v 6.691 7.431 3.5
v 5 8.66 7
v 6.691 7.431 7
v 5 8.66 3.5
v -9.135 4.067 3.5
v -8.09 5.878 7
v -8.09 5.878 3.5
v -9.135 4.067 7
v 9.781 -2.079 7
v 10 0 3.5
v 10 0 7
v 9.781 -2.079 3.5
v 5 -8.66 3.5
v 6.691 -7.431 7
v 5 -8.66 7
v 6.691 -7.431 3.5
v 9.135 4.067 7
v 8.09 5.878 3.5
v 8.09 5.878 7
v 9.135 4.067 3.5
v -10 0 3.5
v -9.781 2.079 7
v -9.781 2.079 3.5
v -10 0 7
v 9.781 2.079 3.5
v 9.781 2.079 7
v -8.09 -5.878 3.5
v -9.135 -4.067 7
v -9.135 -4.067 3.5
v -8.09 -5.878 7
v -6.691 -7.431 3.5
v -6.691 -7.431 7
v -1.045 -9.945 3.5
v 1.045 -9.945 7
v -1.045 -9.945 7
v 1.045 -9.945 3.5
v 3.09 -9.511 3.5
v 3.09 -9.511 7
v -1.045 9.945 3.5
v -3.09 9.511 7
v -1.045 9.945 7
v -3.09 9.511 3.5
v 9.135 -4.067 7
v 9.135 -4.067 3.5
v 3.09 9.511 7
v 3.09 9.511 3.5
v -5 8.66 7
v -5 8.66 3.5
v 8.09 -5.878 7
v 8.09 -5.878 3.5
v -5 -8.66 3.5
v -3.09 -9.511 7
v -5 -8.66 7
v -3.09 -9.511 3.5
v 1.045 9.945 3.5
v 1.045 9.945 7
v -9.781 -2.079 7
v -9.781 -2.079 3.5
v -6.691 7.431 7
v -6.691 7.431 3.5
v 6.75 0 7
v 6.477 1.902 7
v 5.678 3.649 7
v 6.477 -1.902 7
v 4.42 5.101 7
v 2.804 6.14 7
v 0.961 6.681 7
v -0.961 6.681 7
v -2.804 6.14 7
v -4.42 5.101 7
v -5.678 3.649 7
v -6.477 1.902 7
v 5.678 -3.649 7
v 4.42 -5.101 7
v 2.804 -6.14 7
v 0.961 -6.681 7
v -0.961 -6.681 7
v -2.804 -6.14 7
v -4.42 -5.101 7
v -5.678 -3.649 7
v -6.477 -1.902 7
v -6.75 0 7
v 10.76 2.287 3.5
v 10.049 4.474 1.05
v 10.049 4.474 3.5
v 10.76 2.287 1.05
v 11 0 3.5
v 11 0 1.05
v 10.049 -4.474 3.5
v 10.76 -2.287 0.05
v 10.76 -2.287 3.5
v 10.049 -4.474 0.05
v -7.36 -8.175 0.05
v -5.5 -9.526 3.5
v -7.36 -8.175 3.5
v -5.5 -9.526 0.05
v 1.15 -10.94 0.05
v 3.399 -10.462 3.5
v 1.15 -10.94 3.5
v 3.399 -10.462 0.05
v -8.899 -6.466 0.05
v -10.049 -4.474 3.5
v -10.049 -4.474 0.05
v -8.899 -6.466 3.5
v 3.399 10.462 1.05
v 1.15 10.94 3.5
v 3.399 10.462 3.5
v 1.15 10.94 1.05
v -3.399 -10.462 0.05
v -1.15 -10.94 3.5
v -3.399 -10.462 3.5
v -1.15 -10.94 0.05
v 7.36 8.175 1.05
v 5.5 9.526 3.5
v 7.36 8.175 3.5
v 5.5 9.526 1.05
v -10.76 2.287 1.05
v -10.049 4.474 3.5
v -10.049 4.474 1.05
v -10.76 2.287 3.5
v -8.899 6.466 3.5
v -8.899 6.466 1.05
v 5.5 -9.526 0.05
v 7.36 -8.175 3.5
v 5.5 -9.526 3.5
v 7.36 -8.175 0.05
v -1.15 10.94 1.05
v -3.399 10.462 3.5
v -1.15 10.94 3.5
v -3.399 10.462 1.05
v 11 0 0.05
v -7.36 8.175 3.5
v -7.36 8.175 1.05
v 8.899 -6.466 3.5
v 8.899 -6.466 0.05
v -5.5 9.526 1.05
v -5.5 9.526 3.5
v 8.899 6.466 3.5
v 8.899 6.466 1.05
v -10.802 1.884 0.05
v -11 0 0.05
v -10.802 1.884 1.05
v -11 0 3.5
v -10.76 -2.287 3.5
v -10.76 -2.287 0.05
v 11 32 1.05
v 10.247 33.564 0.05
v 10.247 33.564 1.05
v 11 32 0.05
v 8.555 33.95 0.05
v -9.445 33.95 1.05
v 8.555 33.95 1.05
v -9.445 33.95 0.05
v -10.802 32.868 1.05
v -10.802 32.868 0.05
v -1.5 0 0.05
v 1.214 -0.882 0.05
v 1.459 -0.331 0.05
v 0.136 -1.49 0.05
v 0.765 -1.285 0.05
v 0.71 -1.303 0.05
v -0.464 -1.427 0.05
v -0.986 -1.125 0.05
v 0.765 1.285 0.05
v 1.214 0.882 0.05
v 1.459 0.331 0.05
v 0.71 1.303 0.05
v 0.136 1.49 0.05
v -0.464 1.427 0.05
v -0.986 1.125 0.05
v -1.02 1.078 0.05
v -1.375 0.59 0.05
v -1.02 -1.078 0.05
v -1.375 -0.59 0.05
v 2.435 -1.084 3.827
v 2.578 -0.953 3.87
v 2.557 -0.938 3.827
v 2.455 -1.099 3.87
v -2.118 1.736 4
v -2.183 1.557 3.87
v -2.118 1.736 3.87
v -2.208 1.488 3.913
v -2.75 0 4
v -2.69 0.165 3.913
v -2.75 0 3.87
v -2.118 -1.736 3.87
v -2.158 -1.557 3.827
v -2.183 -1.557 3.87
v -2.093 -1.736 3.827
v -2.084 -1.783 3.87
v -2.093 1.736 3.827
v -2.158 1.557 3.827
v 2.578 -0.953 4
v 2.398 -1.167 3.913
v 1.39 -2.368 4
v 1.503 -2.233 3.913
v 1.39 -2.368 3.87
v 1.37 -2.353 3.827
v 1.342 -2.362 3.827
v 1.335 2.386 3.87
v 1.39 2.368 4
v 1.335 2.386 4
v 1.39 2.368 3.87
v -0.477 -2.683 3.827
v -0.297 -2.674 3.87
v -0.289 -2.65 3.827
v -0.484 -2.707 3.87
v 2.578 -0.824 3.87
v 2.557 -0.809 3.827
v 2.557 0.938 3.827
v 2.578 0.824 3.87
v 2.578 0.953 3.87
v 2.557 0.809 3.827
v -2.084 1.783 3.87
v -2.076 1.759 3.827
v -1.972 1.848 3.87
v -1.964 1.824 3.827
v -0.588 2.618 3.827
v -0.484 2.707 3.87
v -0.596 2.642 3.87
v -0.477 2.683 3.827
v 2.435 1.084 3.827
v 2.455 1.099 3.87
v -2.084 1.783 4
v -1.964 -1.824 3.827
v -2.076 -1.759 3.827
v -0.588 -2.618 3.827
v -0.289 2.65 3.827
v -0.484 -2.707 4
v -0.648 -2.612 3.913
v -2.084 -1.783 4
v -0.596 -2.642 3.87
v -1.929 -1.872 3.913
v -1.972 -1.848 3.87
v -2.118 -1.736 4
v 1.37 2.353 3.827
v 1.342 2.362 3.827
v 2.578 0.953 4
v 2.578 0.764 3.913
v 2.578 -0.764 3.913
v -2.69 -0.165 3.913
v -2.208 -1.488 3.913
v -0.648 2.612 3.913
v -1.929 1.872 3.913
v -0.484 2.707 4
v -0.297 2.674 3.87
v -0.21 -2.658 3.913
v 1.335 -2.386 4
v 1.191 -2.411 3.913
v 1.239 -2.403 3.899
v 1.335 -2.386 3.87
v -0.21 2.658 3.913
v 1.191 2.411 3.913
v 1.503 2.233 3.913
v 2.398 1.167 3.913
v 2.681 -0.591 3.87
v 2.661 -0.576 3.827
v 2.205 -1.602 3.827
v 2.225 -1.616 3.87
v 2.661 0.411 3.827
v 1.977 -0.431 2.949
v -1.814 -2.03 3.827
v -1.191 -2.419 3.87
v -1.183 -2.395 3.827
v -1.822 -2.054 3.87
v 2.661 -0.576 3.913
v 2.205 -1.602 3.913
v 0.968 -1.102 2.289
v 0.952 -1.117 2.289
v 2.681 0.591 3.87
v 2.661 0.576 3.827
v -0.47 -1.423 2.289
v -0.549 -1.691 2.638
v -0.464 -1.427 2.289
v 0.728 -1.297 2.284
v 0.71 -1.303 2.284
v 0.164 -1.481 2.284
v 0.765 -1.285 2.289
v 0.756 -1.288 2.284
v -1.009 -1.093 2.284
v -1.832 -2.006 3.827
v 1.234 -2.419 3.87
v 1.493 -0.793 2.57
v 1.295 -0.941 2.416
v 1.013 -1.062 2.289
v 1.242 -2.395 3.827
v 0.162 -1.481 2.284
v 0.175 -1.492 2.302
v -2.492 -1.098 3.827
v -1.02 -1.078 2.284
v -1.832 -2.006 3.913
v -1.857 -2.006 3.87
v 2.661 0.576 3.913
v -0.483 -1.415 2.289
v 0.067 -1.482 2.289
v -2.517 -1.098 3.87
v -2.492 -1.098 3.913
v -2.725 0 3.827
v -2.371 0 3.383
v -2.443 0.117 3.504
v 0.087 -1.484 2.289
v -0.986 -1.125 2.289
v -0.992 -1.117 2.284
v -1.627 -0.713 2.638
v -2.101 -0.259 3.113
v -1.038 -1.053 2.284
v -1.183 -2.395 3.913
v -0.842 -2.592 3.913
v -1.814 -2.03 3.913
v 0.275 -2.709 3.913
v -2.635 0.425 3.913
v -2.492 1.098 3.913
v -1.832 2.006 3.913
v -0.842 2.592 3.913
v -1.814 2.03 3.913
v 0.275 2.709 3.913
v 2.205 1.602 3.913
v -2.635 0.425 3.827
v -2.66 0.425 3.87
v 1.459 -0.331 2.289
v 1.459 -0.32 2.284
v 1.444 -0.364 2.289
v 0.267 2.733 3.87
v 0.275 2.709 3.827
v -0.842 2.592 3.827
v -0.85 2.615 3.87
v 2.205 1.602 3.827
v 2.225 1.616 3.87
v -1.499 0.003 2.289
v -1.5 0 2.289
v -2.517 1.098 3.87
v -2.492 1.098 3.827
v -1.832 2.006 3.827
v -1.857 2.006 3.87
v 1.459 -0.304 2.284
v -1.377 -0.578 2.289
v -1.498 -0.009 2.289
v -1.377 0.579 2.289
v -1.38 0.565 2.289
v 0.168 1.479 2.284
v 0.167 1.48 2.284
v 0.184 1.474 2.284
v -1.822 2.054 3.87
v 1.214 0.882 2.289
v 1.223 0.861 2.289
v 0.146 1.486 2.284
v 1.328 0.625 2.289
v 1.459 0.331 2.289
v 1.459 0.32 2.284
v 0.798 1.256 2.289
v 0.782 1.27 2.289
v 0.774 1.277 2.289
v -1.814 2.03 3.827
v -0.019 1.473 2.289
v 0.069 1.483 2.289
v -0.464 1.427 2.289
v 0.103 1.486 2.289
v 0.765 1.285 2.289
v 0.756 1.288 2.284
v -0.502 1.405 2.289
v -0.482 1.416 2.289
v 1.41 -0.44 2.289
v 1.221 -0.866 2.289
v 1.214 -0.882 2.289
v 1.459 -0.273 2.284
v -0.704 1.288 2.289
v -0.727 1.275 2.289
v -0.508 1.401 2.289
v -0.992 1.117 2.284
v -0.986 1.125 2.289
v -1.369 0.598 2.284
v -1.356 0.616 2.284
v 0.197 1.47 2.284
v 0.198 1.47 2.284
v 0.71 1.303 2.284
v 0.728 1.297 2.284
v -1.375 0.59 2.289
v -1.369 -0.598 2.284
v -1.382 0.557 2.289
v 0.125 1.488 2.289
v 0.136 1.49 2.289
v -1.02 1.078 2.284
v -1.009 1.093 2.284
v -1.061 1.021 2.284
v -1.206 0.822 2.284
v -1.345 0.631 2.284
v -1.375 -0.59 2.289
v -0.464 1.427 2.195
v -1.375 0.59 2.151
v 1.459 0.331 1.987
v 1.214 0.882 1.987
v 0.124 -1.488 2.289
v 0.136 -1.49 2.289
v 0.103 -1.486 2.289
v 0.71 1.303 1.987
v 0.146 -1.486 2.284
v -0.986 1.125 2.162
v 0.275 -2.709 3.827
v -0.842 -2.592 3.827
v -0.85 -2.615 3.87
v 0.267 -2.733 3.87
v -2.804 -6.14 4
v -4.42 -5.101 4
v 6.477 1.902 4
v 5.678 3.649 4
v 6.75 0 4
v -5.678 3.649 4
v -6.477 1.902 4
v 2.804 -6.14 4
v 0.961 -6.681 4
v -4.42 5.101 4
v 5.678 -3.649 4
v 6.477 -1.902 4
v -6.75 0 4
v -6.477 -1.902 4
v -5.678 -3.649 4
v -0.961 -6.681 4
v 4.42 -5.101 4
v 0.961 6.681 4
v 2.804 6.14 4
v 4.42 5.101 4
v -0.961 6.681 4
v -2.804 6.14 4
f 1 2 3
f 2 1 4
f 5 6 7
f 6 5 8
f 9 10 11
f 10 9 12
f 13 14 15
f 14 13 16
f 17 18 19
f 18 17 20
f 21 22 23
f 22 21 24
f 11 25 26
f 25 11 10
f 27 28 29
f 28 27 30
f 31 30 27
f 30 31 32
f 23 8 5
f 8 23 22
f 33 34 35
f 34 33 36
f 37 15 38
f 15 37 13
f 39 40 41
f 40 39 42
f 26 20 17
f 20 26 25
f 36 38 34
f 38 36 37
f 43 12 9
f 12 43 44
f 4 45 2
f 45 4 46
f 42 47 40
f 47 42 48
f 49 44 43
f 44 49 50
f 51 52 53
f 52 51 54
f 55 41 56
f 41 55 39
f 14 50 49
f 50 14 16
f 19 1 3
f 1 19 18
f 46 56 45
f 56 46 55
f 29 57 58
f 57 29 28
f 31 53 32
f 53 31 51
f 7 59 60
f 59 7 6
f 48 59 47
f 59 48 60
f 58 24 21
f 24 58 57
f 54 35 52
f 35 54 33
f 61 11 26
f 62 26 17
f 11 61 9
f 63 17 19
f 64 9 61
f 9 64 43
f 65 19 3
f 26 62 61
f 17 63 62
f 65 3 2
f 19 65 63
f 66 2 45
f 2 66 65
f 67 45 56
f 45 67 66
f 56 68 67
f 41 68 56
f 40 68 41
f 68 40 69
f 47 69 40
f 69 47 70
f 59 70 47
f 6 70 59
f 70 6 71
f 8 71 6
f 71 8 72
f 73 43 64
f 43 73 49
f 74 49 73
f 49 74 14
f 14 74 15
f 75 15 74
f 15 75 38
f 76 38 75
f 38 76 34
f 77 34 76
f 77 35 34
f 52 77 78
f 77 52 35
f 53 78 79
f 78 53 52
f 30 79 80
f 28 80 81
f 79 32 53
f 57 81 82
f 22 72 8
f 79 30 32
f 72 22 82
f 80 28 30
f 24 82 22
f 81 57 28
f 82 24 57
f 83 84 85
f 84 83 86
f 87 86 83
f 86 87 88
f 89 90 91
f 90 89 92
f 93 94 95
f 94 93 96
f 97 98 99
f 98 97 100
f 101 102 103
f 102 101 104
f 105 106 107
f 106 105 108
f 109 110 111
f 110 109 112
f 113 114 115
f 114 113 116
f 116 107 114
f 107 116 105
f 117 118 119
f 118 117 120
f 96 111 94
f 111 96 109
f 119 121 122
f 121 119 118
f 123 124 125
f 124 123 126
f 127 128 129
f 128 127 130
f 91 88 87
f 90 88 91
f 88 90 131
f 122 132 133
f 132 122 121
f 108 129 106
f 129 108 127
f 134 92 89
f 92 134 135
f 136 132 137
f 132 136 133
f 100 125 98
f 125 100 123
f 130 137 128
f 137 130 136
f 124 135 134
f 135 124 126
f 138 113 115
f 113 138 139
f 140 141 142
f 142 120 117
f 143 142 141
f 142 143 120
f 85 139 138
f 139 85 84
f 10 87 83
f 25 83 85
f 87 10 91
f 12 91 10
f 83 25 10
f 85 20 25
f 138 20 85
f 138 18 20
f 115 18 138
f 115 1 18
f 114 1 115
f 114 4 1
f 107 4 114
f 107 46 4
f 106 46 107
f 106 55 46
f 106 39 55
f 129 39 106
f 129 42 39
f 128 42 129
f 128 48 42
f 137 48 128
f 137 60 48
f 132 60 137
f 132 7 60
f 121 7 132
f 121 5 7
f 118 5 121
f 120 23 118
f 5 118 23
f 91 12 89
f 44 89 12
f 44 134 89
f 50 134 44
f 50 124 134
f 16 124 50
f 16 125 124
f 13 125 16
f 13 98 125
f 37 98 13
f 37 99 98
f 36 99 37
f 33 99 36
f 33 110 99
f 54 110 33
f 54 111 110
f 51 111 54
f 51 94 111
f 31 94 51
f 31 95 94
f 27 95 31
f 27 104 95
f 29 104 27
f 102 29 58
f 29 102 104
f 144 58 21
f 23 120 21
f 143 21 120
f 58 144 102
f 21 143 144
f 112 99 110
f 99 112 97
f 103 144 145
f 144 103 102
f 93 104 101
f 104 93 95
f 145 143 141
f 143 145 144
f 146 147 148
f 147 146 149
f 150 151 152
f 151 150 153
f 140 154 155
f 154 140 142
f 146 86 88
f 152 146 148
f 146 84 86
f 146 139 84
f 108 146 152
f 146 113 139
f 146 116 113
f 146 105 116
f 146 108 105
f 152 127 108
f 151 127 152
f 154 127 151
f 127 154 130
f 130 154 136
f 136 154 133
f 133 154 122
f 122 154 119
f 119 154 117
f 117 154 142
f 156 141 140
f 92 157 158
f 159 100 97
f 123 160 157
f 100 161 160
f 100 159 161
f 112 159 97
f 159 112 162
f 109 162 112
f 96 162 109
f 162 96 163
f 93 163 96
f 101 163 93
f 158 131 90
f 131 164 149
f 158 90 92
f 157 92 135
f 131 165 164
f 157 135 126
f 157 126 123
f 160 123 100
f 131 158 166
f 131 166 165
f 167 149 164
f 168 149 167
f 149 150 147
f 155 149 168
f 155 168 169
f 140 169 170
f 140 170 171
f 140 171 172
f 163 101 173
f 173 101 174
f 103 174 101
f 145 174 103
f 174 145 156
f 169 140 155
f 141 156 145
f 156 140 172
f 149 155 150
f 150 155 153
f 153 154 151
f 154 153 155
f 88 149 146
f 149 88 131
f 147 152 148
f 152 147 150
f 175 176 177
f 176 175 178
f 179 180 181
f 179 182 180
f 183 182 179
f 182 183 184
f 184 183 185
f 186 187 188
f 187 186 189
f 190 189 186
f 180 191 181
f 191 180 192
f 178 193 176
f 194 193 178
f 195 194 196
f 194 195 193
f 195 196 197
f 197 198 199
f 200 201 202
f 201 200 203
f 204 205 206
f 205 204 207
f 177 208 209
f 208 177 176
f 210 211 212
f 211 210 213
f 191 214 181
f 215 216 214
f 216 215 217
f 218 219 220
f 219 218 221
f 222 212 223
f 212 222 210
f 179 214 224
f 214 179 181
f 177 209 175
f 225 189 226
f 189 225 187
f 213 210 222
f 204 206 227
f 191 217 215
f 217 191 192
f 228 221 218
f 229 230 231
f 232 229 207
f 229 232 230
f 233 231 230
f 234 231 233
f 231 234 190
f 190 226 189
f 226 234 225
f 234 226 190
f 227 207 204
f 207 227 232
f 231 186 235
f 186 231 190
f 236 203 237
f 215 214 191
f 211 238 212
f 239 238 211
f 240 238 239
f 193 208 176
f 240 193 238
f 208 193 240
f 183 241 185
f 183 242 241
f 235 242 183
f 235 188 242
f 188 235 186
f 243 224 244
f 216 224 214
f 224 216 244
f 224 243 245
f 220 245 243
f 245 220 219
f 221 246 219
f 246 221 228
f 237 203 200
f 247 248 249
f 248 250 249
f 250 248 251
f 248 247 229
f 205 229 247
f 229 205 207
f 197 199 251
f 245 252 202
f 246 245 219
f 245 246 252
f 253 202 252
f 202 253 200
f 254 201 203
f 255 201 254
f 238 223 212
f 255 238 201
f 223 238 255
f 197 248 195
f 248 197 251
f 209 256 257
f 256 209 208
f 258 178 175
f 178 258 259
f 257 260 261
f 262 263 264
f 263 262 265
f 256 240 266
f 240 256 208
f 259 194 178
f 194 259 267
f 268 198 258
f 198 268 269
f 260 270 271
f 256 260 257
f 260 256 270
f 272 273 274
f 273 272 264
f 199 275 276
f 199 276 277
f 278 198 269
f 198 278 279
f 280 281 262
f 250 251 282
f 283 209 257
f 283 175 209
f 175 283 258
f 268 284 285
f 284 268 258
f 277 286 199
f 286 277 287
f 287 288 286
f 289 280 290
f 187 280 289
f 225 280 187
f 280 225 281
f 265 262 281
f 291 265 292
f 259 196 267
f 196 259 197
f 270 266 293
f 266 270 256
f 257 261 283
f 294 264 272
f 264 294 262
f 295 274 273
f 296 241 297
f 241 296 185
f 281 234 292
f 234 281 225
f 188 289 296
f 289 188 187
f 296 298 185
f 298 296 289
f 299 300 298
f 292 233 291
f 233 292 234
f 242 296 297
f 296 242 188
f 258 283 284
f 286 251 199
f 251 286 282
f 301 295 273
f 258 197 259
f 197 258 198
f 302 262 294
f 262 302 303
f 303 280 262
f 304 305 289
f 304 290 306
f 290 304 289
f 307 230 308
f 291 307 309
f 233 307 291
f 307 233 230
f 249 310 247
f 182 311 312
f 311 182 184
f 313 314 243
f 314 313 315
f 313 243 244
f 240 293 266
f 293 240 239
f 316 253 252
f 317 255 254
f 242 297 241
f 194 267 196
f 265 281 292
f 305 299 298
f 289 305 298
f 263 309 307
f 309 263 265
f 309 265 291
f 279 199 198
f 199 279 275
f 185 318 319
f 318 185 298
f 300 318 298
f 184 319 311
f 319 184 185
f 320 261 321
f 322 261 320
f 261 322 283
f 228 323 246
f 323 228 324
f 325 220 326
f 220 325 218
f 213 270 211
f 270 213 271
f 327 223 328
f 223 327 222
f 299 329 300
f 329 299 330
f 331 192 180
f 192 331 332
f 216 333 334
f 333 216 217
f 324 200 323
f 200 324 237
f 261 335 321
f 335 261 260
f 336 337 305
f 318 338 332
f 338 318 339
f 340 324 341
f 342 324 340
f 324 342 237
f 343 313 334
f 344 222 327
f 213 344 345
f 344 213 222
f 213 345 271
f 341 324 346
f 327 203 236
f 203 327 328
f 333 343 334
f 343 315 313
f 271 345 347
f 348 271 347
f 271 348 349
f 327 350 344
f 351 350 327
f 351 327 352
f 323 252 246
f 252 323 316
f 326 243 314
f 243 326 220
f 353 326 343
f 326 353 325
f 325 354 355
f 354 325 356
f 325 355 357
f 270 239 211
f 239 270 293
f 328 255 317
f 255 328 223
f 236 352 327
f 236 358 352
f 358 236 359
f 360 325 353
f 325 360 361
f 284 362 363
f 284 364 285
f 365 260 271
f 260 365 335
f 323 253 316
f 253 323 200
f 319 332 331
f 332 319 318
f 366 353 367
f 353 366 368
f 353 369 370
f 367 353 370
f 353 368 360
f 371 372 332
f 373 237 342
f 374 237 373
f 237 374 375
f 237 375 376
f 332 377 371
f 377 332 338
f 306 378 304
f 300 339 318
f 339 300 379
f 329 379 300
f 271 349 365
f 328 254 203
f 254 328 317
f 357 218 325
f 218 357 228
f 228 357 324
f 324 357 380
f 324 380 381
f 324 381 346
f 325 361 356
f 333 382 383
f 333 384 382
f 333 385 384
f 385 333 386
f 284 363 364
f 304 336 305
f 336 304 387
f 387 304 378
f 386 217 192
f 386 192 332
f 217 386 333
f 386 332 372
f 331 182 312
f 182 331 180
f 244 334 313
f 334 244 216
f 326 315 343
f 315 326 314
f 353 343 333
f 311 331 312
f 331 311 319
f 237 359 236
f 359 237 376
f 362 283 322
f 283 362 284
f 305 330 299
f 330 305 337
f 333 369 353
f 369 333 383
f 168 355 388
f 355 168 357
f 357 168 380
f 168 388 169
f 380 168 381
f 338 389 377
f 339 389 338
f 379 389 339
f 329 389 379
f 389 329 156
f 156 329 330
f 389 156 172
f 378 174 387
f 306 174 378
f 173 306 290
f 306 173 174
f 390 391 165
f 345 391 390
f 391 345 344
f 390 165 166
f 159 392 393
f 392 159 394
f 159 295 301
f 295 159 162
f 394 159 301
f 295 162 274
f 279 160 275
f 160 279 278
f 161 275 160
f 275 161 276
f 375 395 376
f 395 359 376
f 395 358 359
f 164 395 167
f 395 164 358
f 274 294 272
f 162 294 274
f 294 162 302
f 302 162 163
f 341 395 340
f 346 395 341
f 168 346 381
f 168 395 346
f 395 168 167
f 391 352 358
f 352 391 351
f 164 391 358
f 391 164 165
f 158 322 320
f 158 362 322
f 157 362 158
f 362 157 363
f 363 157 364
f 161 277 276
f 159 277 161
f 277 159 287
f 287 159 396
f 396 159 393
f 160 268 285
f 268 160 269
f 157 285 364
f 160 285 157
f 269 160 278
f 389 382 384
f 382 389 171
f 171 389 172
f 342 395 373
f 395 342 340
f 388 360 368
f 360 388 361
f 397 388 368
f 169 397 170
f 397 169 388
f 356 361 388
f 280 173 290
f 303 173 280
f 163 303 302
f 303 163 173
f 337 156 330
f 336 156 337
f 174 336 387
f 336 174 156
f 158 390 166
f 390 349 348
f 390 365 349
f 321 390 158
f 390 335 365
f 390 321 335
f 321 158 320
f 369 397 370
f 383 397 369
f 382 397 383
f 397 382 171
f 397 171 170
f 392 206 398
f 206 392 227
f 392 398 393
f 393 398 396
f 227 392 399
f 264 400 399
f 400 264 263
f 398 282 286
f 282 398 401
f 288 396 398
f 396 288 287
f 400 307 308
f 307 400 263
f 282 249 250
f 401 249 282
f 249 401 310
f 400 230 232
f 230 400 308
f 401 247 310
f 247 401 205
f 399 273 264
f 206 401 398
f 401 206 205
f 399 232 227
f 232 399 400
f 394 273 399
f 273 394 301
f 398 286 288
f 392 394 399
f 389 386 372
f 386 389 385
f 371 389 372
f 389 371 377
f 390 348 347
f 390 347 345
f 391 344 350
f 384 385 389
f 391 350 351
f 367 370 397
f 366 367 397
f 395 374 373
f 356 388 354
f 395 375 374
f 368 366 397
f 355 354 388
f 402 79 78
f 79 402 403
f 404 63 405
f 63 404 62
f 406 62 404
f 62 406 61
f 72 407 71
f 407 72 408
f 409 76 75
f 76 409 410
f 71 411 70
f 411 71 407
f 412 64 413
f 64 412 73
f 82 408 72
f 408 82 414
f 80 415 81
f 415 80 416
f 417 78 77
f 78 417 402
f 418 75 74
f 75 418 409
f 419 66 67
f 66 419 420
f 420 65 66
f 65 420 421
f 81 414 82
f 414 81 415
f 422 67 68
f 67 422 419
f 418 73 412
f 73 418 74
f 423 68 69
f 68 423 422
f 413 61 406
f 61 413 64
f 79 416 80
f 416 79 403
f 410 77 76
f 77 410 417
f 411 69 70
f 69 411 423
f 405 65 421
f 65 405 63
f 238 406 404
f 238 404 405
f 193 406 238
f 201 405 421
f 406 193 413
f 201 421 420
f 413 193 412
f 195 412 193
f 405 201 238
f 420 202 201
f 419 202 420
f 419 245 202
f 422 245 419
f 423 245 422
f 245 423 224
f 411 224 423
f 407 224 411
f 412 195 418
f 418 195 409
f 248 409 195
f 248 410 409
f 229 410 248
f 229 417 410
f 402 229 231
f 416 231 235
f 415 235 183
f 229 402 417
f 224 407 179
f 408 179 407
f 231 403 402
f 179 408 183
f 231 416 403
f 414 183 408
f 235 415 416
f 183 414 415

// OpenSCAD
// current height:washers (0.8*2), piezo (0.3), this part(10)
// total: 11.9

/*difference(){
    cylinder(d=20,h=10);
    translate([0,0,6])
    cylinder(d=13.5,h=10);
    cylinder(d=4,h=10,$fn=10);
}*/

module blade_elem(r_max, w, h, ang_max, segs, i) {
    r_cur = r_max * (i / segs);
    ang_cur = ang_max * (i / segs);
    rotate([0,0,ang_cur])
    translate([0,r_cur,0])
    cylinder(d = w, h = h);
}

module blade(r_max, w, h, ang_max, segs=20, i=0) {
    if (i < (segs - 1)) {
        hull() {
            blade_elem(r_max, w, h, ang_max, segs, i);
            blade_elem(r_max, w, h, ang_max, segs, i+1);
        }
        blade(r_max, w, h, ang_max, segs, i+1);
    }
}

module bladedlid(r, w, h, ang, n) {
    intersection() {
        for (angle = [0 : 360/n : 360]) {
            rotate([0,0,angle])
            blade (r + w, w, h, ang);
        }
        cylinder(r = r, h = h);
    }
}

module top() {
    bladedlid(r = 20.1 / 2, w = 1.5, h = 2, ang = 60, n = 4);
    
    difference() {
        cylinder(d = 22, h = 6);
        cylinder(d = 20+0.05, h = 6);
    }
    
    cylinder(d = 9, h = 3);
}

module m3bolt() {
    linear_extrude(height = 1.6, scale = 2.85 / 5.4, $fn = 15)
    circle(d = 5.4);
    cylinder(d = 2.9, h = 10, $fn = 15);
    translate([0,0,-0.4])
    cylinder(d = 5.4, h = 0.4);
}

module m3bolt_inflated() {
    minkowski() {
        m3bolt();
        sphere(r=0.05);
    }
}

module lid() {
    difference() {
        top();
        translate([0,0,3 - 0.13])
        rotate([0,180,0])
        m3bolt_inflated();
    }
}

module box() {
    difference(){
        union() {
            cylinder(d=20,h=10 - 3);
            cylinder(d=22,h=10 - 6 - 0.5);
            minkowski() {
                translate([-9,0,0.05])
                cube([18,22+10,1-0.1]);
                cylinder(r=2,h=0.1);
            }
        }
        translate([0,0,4])
        cylinder(d=13.5,h=10);
        translate([0,0,4 - 0.13])
        rotate([0,180,0])
        m3bolt_inflated();
    }
    
}

print = 1;
part = 0;
if (print == 0) {
    box();
    #translate([0,0,10])
    rotate([0,180,0])
    lid();
} else {
    if (part == 0) {
        difference() {
            box();
            translate([-100,-100,0])
            cube([200,200,0.05]);
        }
    } else {
        translate([25,0,0])
        lid();
    }
}
